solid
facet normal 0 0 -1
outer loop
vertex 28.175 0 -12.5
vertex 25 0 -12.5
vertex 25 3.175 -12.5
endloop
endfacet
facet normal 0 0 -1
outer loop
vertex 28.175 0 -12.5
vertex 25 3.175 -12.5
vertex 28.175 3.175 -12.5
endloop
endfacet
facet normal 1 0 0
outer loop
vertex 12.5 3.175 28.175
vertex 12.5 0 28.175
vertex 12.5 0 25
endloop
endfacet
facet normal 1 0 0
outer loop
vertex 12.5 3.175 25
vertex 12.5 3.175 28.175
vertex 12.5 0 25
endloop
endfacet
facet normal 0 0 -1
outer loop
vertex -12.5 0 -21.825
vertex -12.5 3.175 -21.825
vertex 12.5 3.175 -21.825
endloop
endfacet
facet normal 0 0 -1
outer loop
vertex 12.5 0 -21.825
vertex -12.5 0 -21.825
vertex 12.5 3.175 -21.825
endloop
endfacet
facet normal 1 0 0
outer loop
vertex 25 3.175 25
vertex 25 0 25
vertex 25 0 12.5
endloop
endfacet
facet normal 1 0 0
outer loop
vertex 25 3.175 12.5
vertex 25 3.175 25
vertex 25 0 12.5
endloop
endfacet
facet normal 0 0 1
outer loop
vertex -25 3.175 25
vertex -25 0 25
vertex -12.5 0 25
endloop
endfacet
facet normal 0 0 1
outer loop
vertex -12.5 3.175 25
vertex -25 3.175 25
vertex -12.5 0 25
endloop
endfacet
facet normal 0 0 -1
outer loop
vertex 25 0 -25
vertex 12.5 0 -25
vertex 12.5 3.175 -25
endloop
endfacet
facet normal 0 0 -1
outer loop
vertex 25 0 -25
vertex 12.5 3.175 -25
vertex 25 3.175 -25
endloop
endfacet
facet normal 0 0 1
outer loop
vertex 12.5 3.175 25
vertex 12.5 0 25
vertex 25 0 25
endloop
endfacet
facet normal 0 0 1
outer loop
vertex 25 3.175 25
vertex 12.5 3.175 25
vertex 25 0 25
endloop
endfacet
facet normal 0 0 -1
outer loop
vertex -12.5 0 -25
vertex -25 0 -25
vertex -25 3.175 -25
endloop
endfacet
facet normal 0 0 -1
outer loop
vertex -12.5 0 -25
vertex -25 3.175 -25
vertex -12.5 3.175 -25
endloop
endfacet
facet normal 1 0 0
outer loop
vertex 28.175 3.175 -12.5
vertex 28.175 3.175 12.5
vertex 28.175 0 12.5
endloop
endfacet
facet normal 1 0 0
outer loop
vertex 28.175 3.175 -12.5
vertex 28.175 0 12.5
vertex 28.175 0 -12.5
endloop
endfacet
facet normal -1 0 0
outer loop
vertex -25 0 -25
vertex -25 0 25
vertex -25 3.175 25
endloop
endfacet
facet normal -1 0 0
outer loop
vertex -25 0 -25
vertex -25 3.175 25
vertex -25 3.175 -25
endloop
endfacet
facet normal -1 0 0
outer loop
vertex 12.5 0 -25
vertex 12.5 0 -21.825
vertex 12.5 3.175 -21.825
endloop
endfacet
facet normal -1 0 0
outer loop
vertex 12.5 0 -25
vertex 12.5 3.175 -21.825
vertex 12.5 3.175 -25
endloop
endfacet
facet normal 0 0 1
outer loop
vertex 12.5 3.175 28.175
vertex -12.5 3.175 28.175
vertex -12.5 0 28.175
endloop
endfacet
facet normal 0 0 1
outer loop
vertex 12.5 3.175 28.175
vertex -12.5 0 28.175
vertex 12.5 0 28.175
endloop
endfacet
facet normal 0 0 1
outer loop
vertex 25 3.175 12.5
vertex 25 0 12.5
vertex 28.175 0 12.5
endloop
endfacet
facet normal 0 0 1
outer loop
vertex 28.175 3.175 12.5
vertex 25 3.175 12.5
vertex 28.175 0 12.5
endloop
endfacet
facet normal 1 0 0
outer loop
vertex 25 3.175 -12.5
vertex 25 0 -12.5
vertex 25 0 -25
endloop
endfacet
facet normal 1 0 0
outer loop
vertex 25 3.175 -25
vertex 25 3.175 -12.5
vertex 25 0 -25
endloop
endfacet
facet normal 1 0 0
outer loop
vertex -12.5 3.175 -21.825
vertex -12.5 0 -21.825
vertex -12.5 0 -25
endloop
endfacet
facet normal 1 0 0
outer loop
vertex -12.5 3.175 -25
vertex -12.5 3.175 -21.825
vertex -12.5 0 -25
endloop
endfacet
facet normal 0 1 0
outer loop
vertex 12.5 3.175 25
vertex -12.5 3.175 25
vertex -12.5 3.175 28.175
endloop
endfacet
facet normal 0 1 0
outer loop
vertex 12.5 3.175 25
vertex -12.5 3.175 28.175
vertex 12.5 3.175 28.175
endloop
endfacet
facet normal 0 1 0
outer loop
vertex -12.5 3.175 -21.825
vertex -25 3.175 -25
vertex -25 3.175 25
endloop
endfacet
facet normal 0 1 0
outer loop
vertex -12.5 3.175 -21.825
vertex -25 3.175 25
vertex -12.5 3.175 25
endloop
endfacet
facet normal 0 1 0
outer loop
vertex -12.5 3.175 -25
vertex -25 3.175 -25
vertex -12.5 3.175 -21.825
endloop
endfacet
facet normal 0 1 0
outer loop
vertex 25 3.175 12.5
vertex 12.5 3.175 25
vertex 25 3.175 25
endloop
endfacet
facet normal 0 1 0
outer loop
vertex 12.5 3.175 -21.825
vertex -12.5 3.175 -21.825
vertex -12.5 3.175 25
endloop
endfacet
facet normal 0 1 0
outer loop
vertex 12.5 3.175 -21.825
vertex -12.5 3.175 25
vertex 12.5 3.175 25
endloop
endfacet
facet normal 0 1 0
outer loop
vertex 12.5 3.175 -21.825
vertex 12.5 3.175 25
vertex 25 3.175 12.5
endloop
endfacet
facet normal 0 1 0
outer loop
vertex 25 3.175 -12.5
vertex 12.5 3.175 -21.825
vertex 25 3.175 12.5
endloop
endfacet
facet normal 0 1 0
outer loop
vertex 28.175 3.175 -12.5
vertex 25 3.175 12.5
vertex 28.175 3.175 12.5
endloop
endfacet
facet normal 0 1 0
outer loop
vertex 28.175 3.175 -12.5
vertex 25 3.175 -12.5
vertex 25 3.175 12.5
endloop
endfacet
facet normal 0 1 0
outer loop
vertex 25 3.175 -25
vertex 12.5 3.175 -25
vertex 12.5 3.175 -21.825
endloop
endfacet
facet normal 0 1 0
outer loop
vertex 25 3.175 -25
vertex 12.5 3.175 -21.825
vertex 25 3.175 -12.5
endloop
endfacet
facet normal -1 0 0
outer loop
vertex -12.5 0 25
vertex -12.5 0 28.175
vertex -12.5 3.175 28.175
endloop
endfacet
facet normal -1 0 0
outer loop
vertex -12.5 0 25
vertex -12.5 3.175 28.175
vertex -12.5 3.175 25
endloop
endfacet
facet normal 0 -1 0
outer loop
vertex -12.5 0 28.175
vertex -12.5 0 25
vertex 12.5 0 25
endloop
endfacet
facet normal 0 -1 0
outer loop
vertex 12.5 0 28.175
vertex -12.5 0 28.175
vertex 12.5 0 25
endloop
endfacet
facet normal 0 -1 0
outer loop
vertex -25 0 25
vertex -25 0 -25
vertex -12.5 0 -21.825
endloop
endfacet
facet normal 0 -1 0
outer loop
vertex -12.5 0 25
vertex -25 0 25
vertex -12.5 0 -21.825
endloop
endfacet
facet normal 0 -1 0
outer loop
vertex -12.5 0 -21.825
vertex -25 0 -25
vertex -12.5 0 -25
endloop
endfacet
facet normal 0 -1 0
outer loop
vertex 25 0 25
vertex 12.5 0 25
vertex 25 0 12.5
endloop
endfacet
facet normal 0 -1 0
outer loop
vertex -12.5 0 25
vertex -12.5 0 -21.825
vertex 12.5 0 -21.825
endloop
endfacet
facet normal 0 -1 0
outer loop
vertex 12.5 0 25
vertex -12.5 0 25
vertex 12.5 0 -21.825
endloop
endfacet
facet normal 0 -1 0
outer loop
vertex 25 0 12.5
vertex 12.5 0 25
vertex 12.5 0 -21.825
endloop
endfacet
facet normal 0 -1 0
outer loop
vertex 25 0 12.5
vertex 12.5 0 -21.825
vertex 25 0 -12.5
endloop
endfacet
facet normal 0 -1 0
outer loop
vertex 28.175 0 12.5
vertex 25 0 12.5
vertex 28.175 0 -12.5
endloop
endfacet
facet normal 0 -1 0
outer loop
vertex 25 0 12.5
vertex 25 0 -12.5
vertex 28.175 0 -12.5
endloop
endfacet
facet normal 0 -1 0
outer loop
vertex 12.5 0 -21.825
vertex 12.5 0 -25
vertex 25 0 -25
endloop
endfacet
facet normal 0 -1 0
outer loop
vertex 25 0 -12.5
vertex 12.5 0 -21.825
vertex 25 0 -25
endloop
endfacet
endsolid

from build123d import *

# Parameters (mm, degrees)
SKETCH1_W           = 50
SKETCH1_H           = 50
BOSS_EXTRUDE1_DEPTH = 3.175
SKETCH3_W           = 3.175
SKETCH3_H           = 25
SKETCH3_W_2         = 25
SKETCH3_H_2         = 3.175
BOSS_EXTRUDE3_DEPTH = 3.175
SKETCH4_W           = 25
SKETCH4_H           = 3.175
CUT_EXTRUDE1_DEPTH  = 3.175


with BuildPart() as part:
    # Sketch1 → Boss-Extrude1 (new body)
    with BuildSketch(Plane(origin=(0, 0, 0), x_dir=(1, 0, 0), z_dir=(0, 1, 0))):
        Rectangle(SKETCH1_W, SKETCH1_H)
    extrude(amount=BOSS_EXTRUDE1_DEPTH)

    # Sketch3 → Boss-Extrude3 (add)
    with BuildSketch(Plane(origin=(0, 3.175, 0), x_dir=(1, 0, 0), z_dir=(0, 1, 0))):
        with Locations((26.5875, 0)):
            Rectangle(SKETCH3_W, SKETCH3_H)
        with Locations((0, -26.5875)):
            Rectangle(SKETCH3_W_2, SKETCH3_H_2)
    extrude(amount=-BOSS_EXTRUDE3_DEPTH)

    # Sketch4 → Cut-Extrude1 (cut)
    with BuildSketch(Plane(origin=(0, 3.175, 0), x_dir=(1, 0, 0), z_dir=(0, 1, 0))):
        with Locations((0, 23.4125)):
            Rectangle(SKETCH4_W, SKETCH4_H)
    extrude(amount=-CUT_EXTRUDE1_DEPTH, mode=Mode.SUBTRACT)


solid = part.part
